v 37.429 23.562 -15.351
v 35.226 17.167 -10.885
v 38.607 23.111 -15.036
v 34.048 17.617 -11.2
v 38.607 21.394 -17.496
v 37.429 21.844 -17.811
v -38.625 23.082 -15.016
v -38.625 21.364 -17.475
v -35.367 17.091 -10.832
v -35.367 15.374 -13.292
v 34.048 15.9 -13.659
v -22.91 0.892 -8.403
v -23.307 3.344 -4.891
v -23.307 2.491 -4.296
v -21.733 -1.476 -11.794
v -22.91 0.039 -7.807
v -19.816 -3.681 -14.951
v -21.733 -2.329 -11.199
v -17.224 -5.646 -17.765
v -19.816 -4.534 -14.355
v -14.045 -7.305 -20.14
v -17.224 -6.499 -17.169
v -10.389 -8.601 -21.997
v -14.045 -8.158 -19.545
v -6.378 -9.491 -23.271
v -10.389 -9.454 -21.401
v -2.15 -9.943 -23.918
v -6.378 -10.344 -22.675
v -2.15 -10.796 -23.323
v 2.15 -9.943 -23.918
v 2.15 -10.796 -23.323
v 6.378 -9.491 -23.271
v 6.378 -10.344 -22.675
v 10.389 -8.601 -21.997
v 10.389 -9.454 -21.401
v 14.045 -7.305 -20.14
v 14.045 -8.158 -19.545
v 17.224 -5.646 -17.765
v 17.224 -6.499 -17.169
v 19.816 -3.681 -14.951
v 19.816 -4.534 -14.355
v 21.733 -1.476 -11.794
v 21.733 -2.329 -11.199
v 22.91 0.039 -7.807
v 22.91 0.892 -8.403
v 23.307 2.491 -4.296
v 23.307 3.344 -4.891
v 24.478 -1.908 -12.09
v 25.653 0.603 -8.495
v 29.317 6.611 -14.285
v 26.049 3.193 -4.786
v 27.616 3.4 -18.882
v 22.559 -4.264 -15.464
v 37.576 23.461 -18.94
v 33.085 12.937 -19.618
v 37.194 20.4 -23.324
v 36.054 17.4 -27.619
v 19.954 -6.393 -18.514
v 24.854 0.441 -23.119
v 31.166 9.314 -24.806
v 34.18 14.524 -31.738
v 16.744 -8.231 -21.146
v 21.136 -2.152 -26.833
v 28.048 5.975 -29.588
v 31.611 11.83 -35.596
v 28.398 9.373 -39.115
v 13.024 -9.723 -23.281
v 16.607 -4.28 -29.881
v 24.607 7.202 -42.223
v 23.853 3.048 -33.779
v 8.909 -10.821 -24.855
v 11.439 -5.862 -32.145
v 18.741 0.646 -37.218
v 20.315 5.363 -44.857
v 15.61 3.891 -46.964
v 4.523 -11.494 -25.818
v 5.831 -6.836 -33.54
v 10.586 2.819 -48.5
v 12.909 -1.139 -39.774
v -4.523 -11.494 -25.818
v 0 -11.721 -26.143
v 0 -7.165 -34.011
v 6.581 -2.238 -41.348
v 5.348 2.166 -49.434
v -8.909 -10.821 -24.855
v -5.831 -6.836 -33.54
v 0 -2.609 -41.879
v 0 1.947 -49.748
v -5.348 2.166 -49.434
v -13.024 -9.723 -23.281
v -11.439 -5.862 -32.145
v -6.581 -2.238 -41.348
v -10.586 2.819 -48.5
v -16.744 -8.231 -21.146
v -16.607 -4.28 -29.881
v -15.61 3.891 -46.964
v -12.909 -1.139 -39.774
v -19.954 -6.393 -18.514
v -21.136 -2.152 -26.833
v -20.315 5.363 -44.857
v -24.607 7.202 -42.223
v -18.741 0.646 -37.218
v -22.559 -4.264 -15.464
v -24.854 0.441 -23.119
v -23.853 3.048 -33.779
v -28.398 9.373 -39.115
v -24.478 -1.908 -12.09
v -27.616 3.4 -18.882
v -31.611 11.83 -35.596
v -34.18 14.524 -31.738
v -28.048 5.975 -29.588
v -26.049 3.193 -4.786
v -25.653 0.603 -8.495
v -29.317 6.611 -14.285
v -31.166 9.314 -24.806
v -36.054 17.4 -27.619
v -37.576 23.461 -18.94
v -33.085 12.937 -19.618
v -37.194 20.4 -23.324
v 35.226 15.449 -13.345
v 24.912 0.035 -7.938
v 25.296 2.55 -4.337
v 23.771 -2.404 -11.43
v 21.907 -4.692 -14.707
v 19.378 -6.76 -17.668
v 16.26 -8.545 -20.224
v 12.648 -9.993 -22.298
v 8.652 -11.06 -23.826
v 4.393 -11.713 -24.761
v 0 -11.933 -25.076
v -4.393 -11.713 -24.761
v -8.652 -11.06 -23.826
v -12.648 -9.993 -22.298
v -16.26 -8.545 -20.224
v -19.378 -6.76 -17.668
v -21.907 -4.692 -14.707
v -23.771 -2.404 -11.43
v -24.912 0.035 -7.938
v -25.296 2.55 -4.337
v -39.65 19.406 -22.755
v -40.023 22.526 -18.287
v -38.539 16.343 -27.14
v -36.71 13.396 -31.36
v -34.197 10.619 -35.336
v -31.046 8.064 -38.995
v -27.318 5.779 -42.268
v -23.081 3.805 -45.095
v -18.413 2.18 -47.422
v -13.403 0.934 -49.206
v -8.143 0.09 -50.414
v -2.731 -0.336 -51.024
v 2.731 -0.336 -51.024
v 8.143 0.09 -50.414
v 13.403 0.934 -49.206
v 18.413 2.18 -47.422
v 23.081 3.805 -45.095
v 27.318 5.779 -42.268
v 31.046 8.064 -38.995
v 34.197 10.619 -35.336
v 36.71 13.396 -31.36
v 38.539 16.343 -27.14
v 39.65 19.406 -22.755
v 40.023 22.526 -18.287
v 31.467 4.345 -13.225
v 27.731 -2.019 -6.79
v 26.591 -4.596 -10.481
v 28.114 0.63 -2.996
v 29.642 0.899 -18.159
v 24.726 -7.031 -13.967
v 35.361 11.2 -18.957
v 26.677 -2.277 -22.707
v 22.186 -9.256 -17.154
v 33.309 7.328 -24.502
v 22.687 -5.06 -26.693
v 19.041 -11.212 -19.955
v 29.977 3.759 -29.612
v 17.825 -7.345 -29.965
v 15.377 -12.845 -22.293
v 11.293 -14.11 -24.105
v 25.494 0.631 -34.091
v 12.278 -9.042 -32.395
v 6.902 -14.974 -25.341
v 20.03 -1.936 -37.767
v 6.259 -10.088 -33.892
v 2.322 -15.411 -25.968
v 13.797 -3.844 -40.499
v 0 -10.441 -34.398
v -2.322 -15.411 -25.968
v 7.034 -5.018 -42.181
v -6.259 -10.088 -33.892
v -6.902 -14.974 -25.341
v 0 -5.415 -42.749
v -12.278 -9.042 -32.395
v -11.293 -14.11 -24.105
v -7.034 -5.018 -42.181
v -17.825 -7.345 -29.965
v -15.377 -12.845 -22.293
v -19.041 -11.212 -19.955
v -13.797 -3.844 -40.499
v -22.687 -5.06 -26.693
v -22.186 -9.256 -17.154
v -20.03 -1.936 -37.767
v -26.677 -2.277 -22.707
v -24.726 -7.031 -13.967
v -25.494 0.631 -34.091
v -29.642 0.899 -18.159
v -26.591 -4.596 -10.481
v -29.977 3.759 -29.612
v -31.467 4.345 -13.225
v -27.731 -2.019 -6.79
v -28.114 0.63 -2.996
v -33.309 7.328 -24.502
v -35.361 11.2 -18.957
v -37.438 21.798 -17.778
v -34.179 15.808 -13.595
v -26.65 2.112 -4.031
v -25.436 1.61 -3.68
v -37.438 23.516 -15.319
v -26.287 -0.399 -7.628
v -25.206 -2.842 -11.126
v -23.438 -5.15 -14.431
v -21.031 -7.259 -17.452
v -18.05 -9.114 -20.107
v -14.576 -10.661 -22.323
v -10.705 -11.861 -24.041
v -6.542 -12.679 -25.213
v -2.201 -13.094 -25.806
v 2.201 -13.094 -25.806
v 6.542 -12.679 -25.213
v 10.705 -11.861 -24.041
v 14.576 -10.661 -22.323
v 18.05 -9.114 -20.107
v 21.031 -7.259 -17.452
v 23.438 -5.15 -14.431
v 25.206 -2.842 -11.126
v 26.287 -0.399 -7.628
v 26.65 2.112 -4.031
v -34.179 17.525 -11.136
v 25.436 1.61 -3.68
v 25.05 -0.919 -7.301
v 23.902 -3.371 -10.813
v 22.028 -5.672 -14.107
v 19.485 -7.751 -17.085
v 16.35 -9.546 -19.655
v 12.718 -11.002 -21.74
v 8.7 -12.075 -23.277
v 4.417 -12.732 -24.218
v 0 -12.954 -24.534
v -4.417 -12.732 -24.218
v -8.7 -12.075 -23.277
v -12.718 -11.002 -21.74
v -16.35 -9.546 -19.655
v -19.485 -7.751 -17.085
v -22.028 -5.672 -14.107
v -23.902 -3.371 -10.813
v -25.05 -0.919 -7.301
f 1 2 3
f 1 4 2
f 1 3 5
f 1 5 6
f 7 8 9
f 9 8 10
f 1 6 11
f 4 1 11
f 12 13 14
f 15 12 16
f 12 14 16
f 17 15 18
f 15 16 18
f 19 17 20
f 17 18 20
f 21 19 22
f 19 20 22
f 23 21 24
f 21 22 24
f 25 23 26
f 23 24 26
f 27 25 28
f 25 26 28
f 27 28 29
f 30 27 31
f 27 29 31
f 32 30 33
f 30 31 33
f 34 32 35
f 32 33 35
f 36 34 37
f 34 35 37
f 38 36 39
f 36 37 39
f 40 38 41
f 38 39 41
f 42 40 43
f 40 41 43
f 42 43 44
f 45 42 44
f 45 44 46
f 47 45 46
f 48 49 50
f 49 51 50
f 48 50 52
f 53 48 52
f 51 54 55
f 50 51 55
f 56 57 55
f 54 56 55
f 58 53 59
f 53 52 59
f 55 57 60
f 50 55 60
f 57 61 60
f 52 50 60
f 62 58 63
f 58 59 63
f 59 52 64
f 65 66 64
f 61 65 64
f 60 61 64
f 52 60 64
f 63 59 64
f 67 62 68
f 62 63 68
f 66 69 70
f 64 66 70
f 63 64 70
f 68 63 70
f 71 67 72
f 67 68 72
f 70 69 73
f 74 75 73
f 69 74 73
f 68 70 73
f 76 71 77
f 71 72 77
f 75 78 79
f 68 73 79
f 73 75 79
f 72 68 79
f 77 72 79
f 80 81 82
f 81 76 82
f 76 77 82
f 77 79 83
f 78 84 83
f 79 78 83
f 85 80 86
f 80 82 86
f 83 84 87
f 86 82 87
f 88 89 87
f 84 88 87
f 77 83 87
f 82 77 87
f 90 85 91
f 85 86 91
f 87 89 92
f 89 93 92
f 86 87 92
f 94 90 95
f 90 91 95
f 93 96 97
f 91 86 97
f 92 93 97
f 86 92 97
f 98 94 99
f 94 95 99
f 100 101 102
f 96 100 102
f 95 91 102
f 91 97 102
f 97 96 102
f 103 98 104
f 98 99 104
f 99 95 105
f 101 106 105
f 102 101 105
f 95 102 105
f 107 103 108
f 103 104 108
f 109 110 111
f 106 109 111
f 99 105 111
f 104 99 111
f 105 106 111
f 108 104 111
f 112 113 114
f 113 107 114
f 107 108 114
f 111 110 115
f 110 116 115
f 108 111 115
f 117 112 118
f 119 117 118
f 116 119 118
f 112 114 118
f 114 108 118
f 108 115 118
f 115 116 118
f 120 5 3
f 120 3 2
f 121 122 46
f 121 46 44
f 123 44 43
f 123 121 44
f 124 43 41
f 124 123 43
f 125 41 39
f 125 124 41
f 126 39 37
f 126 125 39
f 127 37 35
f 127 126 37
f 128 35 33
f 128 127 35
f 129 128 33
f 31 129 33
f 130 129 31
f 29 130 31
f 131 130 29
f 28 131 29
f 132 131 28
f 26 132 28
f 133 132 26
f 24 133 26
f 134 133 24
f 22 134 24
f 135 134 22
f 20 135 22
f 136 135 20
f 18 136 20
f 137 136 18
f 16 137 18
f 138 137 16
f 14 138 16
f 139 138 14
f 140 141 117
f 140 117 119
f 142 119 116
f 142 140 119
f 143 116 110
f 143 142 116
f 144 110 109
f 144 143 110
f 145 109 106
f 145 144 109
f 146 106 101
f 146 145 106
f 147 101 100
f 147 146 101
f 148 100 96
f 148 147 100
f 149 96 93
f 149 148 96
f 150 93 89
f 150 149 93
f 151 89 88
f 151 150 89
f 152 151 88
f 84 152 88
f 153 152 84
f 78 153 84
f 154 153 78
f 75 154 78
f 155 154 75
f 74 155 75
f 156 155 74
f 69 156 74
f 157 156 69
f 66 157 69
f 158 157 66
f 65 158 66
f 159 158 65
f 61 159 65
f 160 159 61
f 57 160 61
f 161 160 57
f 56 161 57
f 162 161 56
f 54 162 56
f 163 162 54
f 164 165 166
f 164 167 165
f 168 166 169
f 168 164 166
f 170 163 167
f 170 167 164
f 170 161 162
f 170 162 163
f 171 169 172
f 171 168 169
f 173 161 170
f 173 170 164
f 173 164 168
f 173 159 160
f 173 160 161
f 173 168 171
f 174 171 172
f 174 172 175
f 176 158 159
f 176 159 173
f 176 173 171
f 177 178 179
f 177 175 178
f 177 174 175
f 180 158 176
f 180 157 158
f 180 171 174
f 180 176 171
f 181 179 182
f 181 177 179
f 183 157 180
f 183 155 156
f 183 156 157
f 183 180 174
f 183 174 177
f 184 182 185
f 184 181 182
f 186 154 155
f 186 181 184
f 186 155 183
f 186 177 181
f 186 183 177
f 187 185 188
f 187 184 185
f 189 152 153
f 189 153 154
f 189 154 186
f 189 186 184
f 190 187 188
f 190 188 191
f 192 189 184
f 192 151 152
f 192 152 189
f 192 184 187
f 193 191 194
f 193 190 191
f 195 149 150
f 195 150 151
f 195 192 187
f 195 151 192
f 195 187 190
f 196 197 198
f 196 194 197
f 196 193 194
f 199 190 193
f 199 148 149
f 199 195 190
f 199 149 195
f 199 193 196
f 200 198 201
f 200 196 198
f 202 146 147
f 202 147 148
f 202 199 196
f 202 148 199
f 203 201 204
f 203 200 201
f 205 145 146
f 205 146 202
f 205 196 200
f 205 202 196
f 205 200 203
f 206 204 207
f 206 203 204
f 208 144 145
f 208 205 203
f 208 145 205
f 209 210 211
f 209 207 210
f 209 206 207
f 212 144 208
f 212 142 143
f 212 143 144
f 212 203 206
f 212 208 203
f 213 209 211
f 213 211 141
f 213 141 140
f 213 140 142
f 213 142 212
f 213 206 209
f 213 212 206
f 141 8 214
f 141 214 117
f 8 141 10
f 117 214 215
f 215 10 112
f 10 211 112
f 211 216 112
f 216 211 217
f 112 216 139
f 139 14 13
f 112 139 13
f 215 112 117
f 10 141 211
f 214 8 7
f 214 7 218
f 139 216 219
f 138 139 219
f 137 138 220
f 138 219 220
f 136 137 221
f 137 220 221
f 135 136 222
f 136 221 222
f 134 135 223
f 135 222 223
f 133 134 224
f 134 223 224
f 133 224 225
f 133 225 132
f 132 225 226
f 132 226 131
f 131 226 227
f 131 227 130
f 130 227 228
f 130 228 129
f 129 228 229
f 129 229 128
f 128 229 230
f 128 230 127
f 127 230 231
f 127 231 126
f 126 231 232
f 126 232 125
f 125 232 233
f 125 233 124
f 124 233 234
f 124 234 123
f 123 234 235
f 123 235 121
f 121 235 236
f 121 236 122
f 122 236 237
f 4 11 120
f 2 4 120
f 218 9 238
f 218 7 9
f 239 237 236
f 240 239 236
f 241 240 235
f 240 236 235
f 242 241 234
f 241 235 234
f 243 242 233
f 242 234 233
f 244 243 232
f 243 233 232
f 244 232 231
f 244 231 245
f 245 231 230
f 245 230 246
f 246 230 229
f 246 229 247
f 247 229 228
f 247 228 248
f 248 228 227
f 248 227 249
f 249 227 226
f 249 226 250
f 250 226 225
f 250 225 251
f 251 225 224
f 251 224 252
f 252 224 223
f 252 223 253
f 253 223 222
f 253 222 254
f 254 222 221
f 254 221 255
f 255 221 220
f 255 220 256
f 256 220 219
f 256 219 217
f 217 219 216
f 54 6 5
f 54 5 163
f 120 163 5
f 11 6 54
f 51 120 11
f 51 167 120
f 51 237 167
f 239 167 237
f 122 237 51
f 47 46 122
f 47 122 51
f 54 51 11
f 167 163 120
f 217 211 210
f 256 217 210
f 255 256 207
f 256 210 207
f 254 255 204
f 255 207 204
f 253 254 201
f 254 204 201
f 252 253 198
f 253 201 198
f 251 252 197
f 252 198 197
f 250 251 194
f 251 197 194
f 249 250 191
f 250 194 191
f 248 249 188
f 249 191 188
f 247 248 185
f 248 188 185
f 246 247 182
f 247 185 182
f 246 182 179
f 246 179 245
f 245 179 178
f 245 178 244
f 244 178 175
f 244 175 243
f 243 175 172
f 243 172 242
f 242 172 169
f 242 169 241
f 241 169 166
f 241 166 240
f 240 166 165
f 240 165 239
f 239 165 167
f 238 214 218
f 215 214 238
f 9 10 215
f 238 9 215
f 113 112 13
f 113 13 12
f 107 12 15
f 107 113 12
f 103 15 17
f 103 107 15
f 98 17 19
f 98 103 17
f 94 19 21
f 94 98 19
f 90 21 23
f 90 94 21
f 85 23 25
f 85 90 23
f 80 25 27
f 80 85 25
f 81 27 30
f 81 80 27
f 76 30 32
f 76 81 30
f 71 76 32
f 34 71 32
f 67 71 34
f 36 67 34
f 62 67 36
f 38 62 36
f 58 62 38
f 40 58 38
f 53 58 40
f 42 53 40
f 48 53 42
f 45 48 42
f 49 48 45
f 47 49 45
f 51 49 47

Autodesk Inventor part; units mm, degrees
ref_plane "YZ Plane" through (0, 0, 0) normal (1, 0, 0) x (0, 1, 0)
ref_plane "XZ Plane" through (0, 0, 0) normal (0, 1, 0) x (-1, 0, 0)
ref_plane "XY Plane" through (0, 0, 0) normal (0, 0, 1) x (1, 0, 0)
sketch "Sketch68" plane through (0, 0, 0) normal (1, 0, 0) x (0, 1, 0)
  line L0 (1, 4.6737) -> (23, 4.6737) construction
  line L1 (7.0021, -2.9903) -> (-7.0029, -0.0135)
  line L2 (7.2385, 26.8729) -> (5.7713, 27.1847)
  line L3 (2.4565, 4.3755) -> (1, 4.6737)
  line L4 (5.7713, 27.1847) -> (1, 4.6737)
  line L5 (7.2385, 26.8729) -> (2.4565, 4.3755)
  point P0 (0, 0)
  point P1 (2.225, 5.1772)
sketch "Sketch184" plane through (0, 0, 0) normal (1, 0, 0) x (0, 1, 0)
  arc A0 (-3.5, -3.0972) -> (0, -1.6204) centre (-4.281, 3.6397) ccw
  arc A1 (0, -1.6204) -> (2.2822, 2) centre (-4.3557, 3.6547) ccw
  arc A2 (2.2822, 2) -> (2.459, 4.3851) centre (-8.8285, 4.0231) ccw
  arc A3 (2.459, 4.3851) -> (2.3883, 6) centre (-72.7121, 1.9029) ccw
  line L0 (-3.5, -3.0972) -> (-3.5, -3.6807) projected
  arc A4 (2.3883, 6) -> (-3.5, -3.0972) centre (8.6947, -4.5362) ccw
  point P0 (0, 0)
ref_plane "Work Plane13" through (-1.8188, 14.8649, 21.2051) normal (0, 0.8198728, -0.5725457) x (1, 0, 0)
sketch "Sketch199" plane through (-1.8188, 14.8649, 21.2051) normal (0, 0.8198728, -0.5725457) x (1, 0, 0)
  arc A0 (-4.7396, 24.5206) -> (-5.4434, 21.3285) centre (-1.0506, 22.0335) ccw
  arc A1 (-3, 27) -> (-4.7396, 24.5206) centre (12.4104, 14.3381) ccw
  arc A2 (-2.529, 32.2114) -> (-3, 27) centre (13.6873, 28.1188) ccw
  arc A3 (-1.0506, 33.1641) -> (-2.529, 32.2114) centre (-1.0598, 31.555) ccw
  line L0 (-1.0506, 33.1641) -> (5.2457, 33.1641)
  arc A4 (6.5345, 31.555) -> (5.2457, 33.1641) centre (3.9319, 30.7911) ccw
  arc A5 (8.0214, 23.5206) -> (6.5345, 31.555) centre (-50.214, 16.898) ccw
  arc A6 (3.9319, 18.2442) -> (8.0214, 23.5206) centre (2.6688, 23.4462) ccw
  arc A7 (-5.4434, 21.3285) -> (-2.264, 17.7532) centre (-1.0506, 22.0335) ccw
  arc A8 (-2.264, 17.7532) -> (3.9319, 18.2442) centre (-0.0763, 29.4839) ccw
  point P0 (1.8188, 25.8963)
ref_plane "Work Plane14" through (-1.8188, 14.8649, 21.2051) normal (0, 0.8198728, -0.5725457) x (1, 0, 0)
sketch "Sketch200" plane through (-1.8188, 14.8649, 21.2051) normal (0, 0.8198728, -0.5725457) x (1, 0, 0)
  arc A0 (-4.7396, 24.5206) -> (-5.4434, 21.3285) centre (-1.0506, 22.0335) ccw
  arc A1 (-3, 27) -> (-4.7396, 24.5206) centre (12.4104, 14.3381) ccw
  arc A2 (-2.529, 32.2114) -> (-3, 27) centre (13.6873, 28.1188) ccw
  arc A3 (-1.0506, 33.1641) -> (-2.529, 32.2114) centre (-1.0598, 31.555) ccw
  line L0 (-1.0506, 33.1641) -> (5.2457, 33.1641)
  arc A4 (6.5345, 31.555) -> (5.2457, 33.1641) centre (3.9319, 30.7911) ccw
  arc A5 (8.0214, 23.5206) -> (6.5345, 31.555) centre (-50.214, 16.898) ccw
  arc A6 (3.9319, 18.2442) -> (8.0214, 23.5206) centre (2.6688, 23.4462) ccw
  arc A7 (-5.4434, 21.3285) -> (-2.264, 17.7532) centre (-1.0506, 22.0335) ccw
  arc A8 (-2.264, 17.7532) -> (3.9319, 18.2442) centre (-0.0763, 29.4839) ccw
  point P0 (1.8188, 25.8963)
ref_plane "Work Plane15" through (-1.8188, 14.8649, 21.2051) normal (0, 0.8198728, -0.5725457) x (1, 0, 0)
sketch "Sketch201" plane through (-1.8188, 14.8649, 21.2051) normal (0, 0.8198728, -0.5725457) x (1, 0, 0)
  arc A0 (-4.7396, 24.5206) -> (-5.4434, 21.3285) centre (-1.0506, 22.0335) ccw
  arc A1 (-3, 27) -> (-4.7396, 24.5206) centre (12.4104, 14.3381) ccw
  arc A2 (-2.529, 32.2114) -> (-3, 27) centre (13.6873, 28.1188) ccw
  arc A3 (-1.0506, 33.1641) -> (-2.529, 32.2114) centre (-1.0598, 31.555) ccw
  line L0 (-1.0506, 33.1641) -> (5.2457, 33.1641)
  arc A4 (6.5345, 31.555) -> (5.2457, 33.1641) centre (3.9319, 30.7911) ccw
  arc A5 (8.0214, 23.5206) -> (6.5345, 31.555) centre (-50.214, 16.898) ccw
  arc A6 (3.9319, 18.2442) -> (8.0214, 23.5206) centre (2.6688, 23.4462) ccw
  arc A7 (-2.264, 17.7532) -> (3.9319, 18.2442) centre (-0.0763, 29.4839) ccw
  arc A8 (-5.4434, 21.3285) -> (-2.264, 17.7532) centre (-1.0506, 22.0335) ccw
  arc A9 (-4.7396, 24.5206) -> (-5.4434, 21.3285) centre (-1.0506, 22.0335) ccw
  arc A10 (-3, 27) -> (-4.7396, 24.5206) centre (12.4104, 14.3381) ccw
  arc A11 (-2.529, 32.2114) -> (-3, 27) centre (13.6873, 28.1188) ccw
  arc A12 (-1.0506, 33.1641) -> (-2.529, 32.2114) centre (-1.0598, 31.555) ccw
  line L1 (-1.0506, 33.1641) -> (5.2457, 33.1641)
  arc A13 (6.5345, 31.555) -> (5.2457, 33.1641) centre (3.9319, 30.7911) ccw
  arc A14 (8.0214, 23.5206) -> (6.5345, 31.555) centre (-50.214, 16.898) ccw
  arc A15 (3.9319, 18.2442) -> (8.0214, 23.5206) centre (2.6688, 23.4462) ccw
  arc A16 (-2.264, 17.7532) -> (3.9319, 18.2442) centre (-0.0763, 29.4839) ccw
  arc A17 (-5.4434, 21.3285) -> (-2.264, 17.7532) centre (-1.0506, 22.0335) ccw
  arc A18 (-4.7396, 24.5206) -> (-5.4434, 21.3285) centre (-1.0506, 22.0335) ccw
  arc A19 (-3, 27) -> (-4.7396, 24.5206) centre (12.4104, 14.3381) ccw
  arc A20 (-2.529, 32.2114) -> (-3, 27) centre (13.6873, 28.1188) ccw
  arc A21 (-1.0506, 33.1641) -> (-2.529, 32.2114) centre (-1.0598, 31.555) ccw
  line L2 (-1.0506, 33.1641) -> (5.2457, 33.1641)
  arc A22 (6.5345, 31.555) -> (5.2457, 33.1641) centre (3.9319, 30.7911) ccw
  arc A23 (8.0214, 23.5206) -> (6.5345, 31.555) centre (-50.214, 16.898) ccw
  arc A24 (3.9319, 18.2442) -> (8.0214, 23.5206) centre (2.6688, 23.4462) ccw
  arc A25 (-2.264, 17.7532) -> (3.9319, 18.2442) centre (-0.0763, 29.4839) ccw
  arc A26 (-5.4434, 21.3285) -> (-2.264, 17.7532) centre (-1.0506, 22.0335) ccw
  arc A27 (-2.529, 32.2114) -> (-3, 27) centre (13.6873, 28.1188) ccw
  arc A28 (-3, 27) -> (-4.7396, 24.5206) centre (12.4104, 14.3381) ccw
  arc A29 (-4.7396, 24.5206) -> (-5.4434, 21.3285) centre (-1.0506, 22.0335) ccw
  arc A30 (-5.4434, 21.3285) -> (-2.264, 17.7532) centre (-1.0506, 22.0335) ccw
  arc A31 (-2.264, 17.7532) -> (3.9319, 18.2442) centre (-0.0763, 29.4839) ccw
  arc A32 (3.9319, 18.2442) -> (8.0214, 23.5206) centre (2.6688, 23.4462) ccw
  arc A33 (8.0214, 23.5206) -> (6.5345, 31.555) centre (-50.214, 16.898) ccw
  arc A34 (6.5345, 31.555) -> (5.2457, 33.1641) centre (3.9319, 30.7911) ccw
  line L3 (-1.0506, 33.1641) -> (5.2457, 33.1641)
  arc A35 (-1.0506, 33.1641) -> (-2.529, 32.2114) centre (-1.0598, 31.555) ccw
  arc A36 (-3.4348, 34.2537) -> (-4, 28) centre (16.0247, 29.3425) ccw
  arc A37 (-4, 28) -> (-6.0875, 25.0247) centre (14.4925, 12.8057) ccw
  arc A38 (-3.1168, 16.9038) -> (4.3183, 17.4931) centre (-0.4915, 30.9807) ccw
  arc A39 (4.3183, 17.4931) -> (9.2257, 23.8247) centre (2.8025, 23.7355) ccw
  arc A40 (9.2257, 23.8247) -> (7.4414, 33.4659) centre (-60.6567, 15.8776) ccw
  arc A41 (7.4414, 33.4659) -> (5.8948, 35.3969) centre (4.3183, 32.5493) ccw
  line L4 (-1.6607, 35.3969) -> (5.8948, 35.3969)
  arc A42 (-1.6607, 35.3969) -> (-3.4348, 34.2537) centre (-1.6718, 33.4659) ccw
  arc A43 (-6.0875, 25.0247) -> (-6.9321, 21.1943) centre (-1.6607, 22.0403) ccw
  arc A44 (-6.9321, 21.1943) -> (-3.1168, 16.9038) centre (-1.6607, 22.0403) ccw
  point P0 (1.8188, 25.8963)
sketch "Sketch213" plane through (0, 0, 0) normal (1, 0, 0) x (0, 1, 0)
  line L0 (13.3414, -11.8728) -> (-10.8201, 5)
  line L1 (46.9769, 13.1952) -> (16.4024, 18.5466)
  line L2 (-15.4661, -26.0463) -> (-0.3893, -51.1005)
  line L3 (-0.3893, -51.1005) -> (1.9473, -49.7476)
  line L4 (46.9769, 13.1952) -> (46.7355, 11.8161)
  line L5 (1.9473, -49.7476) -> (-11.7207, -26.1425)
  line L6 (-11.7207, -26.1425) -> (-10, -24)
  line L7 (-10, -24) -> (-10.853, -23.4043)
  line L8 (46.7355, 11.8161) -> (18.2275, 16.8059)
  line L9 (18.2275, 16.8059) -> (17, 15)
  line L10 (17, 15) -> (16.3637, 15.4444)
  line L11 (16.3637, 15.4444) -> (17.062, 16.4444)
  line L12 (17.062, 16.4444) -> (17.3561, 17.7094)
  line L13 (17.3561, 17.7094) -> (16.3637, 17.6698)
  line L14 (16.3637, 17.6698) -> (16.4024, 18.5466)
  line L15 (-10.853, -23.4043) -> (-11.9333, -25.0763)
  line L16 (-11.9333, -25.0763) -> (-13.146, -25.8811)
  line L17 (-13.146, -25.8811) -> (-12.9536, -24.5344)
  line L18 (-12.9536, -24.5344) -> (-15.4661, -26.0463)
  point P0 (0, 0)
  point P1 (3.3399, -2.2736)
  point P2 (-1.2043, -8.7808)
  dimension "d600" = 2.7
  dimension "d601" = 1.4
  dimension "d603" = 1.265
revolve "Revolution6" add sketch "Sketch213" angle 180 mid plane about axis through (0, 13.3414, -11.8728) along (0, -0.8198728, 0.5725457) contours L18 L17 L16 L15 L7 L6 L5 L3 L2
sketch "Sketch214" plane through (-28.1141, 0.6305, -2.9963) normal (0, 0.5725457, 0.8198728) x (0.9133048, 0.3339151, -0.2331846)
  line L0 (71.2508, -4.0445) -> (70.3985, -3.0629)
  line L1 (70.3985, -3.0629) -> (64.3578, -8.3078)
  line L2 (71.2508, -4.0445) -> (65.2101, -9.2894)
  line L3 (64.3578, -8.3078) -> (65.2101, -9.2894)
  line L4 (2.6996, 29.2863) -> (0, 29.2408) projected
  line L5 (3.1595, 2.0136) -> (2.6996, 29.2863) projected
  line L6 (0, 29.2408) -> (0, 0) projected
  line L7 (0.7, 27.3772) -> (2, 27.3772)
  line L8 (0.7, 27.3772) -> (0.7, 19.3772)
  line L9 (2, 27.3772) -> (2, 19.3772)
  line L10 (0.7, 19.3772) -> (2, 19.3772)
  line L11 (51.3534, -22.9004) -> (73.1067, -3.3602) projected
  line L12 (73.1067, -3.3602) -> (71.3365, -1.3215) projected
  line L13 (71.3365, -1.3215) -> (50.7401, -19.2043) projected
  point P0 (24.7675, -13.4891)
  dimension "d606" = 8
  dimension "d625" = 90
  dimension "d626" = 0.7
  dimension "d630" = 1.3
  dimension "d635" = 0.7
  dimension "d637" = 1.85
extrude "Extrusion162" add sketch "Sketch214" along normal blind 3
properties part number "A1_V1_M2_dropArm_WOK_meso_tall_VIS_rt"
